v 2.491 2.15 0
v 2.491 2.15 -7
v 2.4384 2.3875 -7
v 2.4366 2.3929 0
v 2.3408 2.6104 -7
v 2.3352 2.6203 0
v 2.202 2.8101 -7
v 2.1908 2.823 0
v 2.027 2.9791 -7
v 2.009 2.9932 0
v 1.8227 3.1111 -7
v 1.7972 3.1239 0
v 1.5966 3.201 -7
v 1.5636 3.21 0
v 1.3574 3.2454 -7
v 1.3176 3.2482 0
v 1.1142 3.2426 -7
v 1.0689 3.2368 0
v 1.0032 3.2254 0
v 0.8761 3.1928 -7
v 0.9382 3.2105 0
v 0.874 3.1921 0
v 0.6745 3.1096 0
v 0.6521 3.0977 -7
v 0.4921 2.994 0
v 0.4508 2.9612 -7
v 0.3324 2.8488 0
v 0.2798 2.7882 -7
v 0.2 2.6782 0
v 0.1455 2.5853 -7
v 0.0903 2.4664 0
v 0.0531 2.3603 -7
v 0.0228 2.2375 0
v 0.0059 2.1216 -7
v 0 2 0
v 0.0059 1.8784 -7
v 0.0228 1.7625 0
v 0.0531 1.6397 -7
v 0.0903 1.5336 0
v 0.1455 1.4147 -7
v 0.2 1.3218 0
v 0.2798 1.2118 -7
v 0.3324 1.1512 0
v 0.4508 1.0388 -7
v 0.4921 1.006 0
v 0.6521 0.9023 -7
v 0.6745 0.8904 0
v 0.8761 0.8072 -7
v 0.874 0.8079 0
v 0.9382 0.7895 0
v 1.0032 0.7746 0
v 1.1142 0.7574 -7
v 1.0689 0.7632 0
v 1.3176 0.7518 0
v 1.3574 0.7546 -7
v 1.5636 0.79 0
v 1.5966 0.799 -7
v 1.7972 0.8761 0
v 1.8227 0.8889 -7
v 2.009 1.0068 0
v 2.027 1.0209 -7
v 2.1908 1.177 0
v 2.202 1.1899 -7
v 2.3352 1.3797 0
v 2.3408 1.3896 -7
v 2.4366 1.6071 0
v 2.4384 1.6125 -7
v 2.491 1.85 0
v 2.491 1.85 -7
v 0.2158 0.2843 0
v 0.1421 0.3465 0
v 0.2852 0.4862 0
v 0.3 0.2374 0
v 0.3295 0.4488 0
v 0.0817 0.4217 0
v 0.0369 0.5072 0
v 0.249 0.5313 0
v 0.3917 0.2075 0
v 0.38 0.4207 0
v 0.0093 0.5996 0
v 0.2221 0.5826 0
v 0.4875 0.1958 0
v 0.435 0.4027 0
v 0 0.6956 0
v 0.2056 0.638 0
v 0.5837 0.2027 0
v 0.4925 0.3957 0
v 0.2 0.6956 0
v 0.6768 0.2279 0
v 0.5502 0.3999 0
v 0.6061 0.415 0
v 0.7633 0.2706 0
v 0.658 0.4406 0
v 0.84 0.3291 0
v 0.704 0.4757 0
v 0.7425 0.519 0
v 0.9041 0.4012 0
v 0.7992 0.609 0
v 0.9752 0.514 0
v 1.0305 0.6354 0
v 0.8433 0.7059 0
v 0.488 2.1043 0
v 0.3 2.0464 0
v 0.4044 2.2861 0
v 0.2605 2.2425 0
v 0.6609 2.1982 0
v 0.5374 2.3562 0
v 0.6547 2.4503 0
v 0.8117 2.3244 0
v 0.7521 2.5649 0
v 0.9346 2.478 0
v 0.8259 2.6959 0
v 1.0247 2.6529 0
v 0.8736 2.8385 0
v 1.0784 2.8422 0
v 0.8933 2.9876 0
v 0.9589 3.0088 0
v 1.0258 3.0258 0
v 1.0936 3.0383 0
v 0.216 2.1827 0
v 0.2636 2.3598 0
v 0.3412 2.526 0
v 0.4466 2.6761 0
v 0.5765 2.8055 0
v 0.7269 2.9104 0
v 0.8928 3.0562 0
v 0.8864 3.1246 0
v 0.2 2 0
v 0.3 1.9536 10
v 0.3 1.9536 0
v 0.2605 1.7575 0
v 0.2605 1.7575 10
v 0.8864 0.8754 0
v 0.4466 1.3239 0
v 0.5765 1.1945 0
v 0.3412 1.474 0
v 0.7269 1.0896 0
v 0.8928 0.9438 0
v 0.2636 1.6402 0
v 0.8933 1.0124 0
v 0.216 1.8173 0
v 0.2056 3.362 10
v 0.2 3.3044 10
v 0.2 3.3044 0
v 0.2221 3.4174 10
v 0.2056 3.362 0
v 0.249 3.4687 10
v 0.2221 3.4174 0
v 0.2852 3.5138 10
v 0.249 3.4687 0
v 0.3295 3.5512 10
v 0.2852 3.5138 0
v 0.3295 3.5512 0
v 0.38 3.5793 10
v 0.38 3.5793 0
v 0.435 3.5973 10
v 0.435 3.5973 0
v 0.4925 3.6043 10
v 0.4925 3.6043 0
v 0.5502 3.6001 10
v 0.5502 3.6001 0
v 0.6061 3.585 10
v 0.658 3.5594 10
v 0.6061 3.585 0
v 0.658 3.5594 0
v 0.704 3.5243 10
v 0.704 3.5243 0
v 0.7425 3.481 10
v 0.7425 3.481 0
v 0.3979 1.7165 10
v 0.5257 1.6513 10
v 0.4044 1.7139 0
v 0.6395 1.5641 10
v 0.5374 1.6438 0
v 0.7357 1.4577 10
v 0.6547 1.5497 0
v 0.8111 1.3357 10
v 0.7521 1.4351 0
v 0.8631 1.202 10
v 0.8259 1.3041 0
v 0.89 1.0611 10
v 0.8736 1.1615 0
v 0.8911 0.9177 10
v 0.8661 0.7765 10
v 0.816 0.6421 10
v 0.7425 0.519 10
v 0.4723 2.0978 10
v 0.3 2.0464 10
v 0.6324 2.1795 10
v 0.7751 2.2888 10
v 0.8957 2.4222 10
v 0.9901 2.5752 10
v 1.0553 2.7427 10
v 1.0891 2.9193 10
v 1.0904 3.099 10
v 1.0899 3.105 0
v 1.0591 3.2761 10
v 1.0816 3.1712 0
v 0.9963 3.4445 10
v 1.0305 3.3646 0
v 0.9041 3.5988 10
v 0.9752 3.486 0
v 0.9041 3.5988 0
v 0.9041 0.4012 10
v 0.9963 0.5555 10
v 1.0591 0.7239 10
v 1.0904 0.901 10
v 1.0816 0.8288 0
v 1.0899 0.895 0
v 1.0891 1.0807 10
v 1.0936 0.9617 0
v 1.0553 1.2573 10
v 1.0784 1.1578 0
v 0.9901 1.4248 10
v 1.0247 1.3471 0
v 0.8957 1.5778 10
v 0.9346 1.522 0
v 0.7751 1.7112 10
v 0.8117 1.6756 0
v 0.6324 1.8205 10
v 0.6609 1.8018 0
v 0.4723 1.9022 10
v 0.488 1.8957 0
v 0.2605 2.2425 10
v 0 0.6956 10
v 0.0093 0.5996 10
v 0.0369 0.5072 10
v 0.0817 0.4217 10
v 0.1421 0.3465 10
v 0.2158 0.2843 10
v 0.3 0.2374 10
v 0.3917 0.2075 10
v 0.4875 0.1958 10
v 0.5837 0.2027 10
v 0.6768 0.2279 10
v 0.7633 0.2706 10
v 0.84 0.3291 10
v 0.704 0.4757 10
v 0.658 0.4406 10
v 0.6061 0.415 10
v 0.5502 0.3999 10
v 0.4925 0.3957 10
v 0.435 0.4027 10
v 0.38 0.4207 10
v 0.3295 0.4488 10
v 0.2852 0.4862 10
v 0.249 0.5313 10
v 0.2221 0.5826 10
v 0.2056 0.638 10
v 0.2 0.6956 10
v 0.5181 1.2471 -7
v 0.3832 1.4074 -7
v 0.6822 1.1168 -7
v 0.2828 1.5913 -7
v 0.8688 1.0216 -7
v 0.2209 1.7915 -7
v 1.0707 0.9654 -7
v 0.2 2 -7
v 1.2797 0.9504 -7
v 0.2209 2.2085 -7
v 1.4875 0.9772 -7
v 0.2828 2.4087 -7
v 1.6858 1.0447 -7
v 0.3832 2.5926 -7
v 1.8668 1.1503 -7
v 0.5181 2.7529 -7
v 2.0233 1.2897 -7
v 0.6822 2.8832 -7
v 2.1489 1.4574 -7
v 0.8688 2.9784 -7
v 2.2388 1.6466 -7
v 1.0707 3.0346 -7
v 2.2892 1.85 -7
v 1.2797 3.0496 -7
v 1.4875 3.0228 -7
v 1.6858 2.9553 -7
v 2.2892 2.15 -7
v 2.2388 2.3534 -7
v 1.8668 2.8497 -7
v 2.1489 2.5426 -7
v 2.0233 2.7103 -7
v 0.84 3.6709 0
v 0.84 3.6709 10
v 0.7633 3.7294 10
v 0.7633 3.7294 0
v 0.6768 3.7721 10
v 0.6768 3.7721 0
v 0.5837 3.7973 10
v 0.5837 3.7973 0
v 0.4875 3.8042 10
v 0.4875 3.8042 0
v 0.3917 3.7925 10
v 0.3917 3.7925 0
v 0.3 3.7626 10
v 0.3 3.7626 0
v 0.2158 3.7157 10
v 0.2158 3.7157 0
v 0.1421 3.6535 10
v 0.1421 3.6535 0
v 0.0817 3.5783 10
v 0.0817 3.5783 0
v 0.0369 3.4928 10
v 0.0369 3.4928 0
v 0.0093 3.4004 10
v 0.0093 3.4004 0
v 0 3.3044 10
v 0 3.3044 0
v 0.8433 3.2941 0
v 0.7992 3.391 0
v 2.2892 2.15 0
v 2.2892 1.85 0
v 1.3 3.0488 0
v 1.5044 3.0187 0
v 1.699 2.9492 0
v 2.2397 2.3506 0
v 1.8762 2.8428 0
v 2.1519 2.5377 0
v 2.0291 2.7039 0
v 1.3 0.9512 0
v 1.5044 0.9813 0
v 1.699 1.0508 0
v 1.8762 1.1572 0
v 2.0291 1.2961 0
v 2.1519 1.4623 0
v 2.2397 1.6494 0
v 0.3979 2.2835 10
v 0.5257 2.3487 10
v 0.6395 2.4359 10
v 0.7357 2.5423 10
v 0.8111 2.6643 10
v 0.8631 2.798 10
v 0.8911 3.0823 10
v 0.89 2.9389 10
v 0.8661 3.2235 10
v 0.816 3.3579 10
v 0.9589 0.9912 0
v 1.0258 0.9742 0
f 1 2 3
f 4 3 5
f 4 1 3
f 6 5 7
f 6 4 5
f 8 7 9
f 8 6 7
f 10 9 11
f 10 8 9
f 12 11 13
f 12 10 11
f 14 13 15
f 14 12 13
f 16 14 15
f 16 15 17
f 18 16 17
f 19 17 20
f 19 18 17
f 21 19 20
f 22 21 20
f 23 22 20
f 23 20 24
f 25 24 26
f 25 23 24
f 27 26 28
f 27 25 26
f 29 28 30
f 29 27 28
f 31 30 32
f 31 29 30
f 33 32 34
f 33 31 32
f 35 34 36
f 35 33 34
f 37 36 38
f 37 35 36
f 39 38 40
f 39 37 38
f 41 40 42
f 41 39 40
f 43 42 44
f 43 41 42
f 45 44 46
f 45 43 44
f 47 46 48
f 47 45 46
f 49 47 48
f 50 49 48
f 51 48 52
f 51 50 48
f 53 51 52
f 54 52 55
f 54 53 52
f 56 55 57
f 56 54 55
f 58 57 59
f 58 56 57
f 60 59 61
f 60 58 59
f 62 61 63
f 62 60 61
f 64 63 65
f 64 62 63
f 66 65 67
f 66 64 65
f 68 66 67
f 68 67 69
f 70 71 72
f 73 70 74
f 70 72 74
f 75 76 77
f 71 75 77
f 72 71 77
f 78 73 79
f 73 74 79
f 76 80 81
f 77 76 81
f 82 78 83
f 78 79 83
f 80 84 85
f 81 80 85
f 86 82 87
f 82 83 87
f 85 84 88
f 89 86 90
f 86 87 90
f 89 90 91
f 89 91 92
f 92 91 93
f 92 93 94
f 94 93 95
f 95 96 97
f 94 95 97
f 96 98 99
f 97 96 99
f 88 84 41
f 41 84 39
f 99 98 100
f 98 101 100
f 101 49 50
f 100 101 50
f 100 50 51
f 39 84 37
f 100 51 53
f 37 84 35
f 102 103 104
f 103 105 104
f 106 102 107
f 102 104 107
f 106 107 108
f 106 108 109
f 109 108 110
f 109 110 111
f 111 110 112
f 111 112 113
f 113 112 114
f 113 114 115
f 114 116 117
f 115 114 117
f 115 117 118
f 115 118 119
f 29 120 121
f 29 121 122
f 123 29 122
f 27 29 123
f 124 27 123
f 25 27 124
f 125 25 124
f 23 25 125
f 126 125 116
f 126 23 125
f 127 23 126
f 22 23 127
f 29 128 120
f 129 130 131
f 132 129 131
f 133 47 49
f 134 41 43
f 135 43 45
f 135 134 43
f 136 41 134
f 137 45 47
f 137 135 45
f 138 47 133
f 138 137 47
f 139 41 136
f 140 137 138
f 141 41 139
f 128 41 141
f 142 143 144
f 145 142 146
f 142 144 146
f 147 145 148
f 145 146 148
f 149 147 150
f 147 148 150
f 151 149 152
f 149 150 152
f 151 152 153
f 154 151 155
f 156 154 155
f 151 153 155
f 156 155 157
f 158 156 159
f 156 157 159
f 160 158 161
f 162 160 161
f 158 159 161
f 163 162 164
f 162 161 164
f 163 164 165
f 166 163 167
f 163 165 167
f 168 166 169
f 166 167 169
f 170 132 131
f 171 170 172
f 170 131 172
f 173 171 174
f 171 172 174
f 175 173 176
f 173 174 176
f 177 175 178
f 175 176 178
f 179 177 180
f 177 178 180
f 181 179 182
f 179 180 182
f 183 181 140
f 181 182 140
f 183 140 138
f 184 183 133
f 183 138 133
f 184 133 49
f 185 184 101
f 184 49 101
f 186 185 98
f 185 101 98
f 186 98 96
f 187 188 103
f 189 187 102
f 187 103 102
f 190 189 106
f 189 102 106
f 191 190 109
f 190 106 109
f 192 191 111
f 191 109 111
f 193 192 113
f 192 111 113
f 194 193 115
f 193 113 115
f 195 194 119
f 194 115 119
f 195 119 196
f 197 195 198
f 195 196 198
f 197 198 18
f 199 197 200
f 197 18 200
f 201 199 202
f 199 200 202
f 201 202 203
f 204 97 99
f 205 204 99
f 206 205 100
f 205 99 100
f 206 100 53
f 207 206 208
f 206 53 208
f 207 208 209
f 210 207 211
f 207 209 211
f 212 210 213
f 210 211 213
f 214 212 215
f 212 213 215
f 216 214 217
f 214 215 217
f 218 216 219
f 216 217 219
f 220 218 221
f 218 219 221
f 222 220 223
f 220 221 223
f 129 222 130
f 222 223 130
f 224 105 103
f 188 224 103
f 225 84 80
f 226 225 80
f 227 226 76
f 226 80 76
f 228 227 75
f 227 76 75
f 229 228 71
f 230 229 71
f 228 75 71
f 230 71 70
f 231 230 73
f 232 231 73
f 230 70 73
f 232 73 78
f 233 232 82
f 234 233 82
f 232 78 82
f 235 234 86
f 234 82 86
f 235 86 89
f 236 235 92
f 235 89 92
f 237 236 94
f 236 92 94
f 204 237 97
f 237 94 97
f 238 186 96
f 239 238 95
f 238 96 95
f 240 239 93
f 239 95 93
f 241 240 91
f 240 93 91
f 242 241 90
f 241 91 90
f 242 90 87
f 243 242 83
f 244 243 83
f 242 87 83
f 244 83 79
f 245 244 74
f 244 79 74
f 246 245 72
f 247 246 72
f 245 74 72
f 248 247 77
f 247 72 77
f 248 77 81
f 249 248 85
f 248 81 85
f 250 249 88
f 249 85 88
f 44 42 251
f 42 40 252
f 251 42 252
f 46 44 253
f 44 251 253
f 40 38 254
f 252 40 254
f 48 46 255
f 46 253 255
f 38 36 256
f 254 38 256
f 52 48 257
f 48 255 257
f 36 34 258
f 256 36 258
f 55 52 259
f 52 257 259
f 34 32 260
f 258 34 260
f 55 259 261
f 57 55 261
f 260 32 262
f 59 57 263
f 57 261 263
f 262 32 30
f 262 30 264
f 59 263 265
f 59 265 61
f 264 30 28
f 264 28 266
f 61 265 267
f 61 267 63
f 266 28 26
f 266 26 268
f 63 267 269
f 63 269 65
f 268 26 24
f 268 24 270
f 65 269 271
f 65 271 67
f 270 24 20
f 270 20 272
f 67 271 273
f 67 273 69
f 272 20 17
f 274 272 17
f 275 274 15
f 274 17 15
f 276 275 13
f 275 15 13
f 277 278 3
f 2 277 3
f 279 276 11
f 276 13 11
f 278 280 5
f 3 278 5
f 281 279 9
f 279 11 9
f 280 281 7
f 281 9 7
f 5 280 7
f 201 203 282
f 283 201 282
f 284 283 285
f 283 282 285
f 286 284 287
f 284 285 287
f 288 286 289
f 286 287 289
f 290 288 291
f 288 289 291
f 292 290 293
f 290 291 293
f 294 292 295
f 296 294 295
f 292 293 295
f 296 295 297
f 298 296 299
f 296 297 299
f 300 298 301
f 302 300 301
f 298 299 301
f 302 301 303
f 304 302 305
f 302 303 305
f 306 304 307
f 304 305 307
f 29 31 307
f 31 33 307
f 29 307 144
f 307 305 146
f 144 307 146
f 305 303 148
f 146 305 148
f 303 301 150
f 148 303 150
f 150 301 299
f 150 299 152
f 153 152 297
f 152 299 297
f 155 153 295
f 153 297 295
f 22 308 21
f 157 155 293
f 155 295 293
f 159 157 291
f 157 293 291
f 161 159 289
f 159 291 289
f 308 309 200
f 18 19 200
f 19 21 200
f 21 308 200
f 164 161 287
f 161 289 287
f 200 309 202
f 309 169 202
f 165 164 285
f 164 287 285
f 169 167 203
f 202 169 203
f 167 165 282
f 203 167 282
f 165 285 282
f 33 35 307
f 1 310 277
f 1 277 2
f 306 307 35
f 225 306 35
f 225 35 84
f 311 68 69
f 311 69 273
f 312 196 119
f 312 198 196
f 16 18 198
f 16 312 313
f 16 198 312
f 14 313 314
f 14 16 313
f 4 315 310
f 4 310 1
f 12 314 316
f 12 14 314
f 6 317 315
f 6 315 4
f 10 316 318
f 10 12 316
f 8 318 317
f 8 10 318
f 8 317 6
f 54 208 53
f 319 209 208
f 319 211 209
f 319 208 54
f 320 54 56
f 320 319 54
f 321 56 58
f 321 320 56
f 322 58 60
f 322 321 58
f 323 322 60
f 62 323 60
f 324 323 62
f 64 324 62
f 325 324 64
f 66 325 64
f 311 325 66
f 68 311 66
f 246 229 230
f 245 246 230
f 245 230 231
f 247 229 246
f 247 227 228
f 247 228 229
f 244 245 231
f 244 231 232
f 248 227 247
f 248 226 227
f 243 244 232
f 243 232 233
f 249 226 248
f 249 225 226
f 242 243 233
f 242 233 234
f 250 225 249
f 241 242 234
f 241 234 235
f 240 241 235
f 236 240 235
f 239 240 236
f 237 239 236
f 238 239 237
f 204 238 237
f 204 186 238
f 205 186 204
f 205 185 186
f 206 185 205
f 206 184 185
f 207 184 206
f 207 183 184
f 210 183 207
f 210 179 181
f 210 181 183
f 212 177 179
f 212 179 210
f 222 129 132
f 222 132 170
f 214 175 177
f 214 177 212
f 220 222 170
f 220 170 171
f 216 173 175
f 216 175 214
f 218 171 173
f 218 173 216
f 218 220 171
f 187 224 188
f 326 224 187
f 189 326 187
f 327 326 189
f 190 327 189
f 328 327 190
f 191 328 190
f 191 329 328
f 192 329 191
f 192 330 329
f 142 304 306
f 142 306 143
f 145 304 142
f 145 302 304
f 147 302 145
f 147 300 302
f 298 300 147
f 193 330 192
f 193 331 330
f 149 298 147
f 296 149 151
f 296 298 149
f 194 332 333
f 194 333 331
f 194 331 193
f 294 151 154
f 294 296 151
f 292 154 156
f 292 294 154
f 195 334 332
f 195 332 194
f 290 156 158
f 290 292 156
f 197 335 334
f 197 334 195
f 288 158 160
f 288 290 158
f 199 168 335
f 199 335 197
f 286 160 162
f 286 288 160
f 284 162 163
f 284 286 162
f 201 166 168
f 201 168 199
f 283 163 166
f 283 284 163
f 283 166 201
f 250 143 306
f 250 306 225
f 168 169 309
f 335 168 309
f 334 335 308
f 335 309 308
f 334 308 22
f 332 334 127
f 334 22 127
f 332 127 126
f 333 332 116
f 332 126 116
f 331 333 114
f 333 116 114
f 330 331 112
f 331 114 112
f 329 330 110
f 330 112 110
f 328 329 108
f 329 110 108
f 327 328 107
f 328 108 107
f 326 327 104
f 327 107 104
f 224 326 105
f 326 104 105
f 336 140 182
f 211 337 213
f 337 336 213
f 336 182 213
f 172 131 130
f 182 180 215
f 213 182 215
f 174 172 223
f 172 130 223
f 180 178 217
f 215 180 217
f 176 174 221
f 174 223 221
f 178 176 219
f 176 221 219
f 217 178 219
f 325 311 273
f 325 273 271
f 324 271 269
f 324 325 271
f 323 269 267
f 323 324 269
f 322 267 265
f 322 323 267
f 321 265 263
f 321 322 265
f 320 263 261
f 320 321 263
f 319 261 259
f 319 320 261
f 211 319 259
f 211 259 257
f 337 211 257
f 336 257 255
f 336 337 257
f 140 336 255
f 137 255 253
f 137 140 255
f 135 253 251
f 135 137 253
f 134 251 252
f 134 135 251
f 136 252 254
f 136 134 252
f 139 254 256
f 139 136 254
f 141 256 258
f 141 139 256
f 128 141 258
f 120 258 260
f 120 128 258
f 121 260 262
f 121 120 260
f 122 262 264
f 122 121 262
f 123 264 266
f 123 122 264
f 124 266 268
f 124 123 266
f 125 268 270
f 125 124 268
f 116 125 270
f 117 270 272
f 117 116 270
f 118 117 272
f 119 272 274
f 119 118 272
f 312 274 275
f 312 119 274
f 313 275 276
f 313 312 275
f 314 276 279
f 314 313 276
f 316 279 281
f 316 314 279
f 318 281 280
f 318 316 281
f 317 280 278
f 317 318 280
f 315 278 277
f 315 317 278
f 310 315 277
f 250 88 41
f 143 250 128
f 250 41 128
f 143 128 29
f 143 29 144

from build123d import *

# Parameters (mm, degrees)
EXTRUDE_1_DEPTH = 10
EXTRUDE_2_DEPTH = 7


with BuildPart() as part:
    # Эскиз1 → Вытянуть1 (new body)
    with BuildSketch(Plane.XY):
        with BuildLine():
            Line((0.2, 0.695621493), (0.2, 3.304378507))
            ThreePointArc((0.2, 3.304378507), (0.407098908, 3.589631705), (0.74246258, 3.481047398))
            ThreePointArc((0.74246258, 3.481047398), (0.840114832, 2.729978951), (0.260484004, 2.242467025))
            Line((0.260484004, 2.242467025), (0.3, 2.046409671))
            ThreePointArc((0.3, 2.046409671), (1.026500083, 2.657449384), (0.9041043, 3.598826659))
            ThreePointArc((0.9041043, 3.598826659), (0.345164846, 3.779800504), (0, 3.304378507))
            Line((0, 3.304378507), (0, 0.695621493))
            ThreePointArc((0, 0.695621493), (0.345164846, 0.220199496), (0.9041043, 0.401173341))
            ThreePointArc((0.9041043, 0.401173341), (1.026500083, 1.342550616), (0.3, 1.953590329))
            Line((0.3, 1.953590329), (0.260484004, 1.757532975))
            ThreePointArc((0.260484004, 1.757532975), (0.840114832, 1.270021049), (0.74246258, 0.518952602))
            ThreePointArc((0.74246258, 0.518952602), (0.407098908, 0.410368295), (0.2, 0.695621493))
        make_face()
    extrude(amount=EXTRUDE_1_DEPTH)

    # Эскиз2 → Вытянуть2 (add)
    with BuildSketch(Plane(origin=(0, 0, 0), x_dir=(-1, 0, 0), z_dir=(0, 0, -1))):
        with BuildLine():
            Line((-2.490967365, 1.85), (-2.289230485, 1.85))
            ThreePointArc((-2.289230485, 1.85), (-0.2, 2), (-2.289230485, 2.15))
            Line((-2.289230485, 2.15), (-2.490967365, 2.15))
            ThreePointArc((-2.490967365, 2.15), (0, 2), (-2.490967365, 1.85))
        make_face()
    extrude(amount=EXTRUDE_2_DEPTH)


solid = part.part
